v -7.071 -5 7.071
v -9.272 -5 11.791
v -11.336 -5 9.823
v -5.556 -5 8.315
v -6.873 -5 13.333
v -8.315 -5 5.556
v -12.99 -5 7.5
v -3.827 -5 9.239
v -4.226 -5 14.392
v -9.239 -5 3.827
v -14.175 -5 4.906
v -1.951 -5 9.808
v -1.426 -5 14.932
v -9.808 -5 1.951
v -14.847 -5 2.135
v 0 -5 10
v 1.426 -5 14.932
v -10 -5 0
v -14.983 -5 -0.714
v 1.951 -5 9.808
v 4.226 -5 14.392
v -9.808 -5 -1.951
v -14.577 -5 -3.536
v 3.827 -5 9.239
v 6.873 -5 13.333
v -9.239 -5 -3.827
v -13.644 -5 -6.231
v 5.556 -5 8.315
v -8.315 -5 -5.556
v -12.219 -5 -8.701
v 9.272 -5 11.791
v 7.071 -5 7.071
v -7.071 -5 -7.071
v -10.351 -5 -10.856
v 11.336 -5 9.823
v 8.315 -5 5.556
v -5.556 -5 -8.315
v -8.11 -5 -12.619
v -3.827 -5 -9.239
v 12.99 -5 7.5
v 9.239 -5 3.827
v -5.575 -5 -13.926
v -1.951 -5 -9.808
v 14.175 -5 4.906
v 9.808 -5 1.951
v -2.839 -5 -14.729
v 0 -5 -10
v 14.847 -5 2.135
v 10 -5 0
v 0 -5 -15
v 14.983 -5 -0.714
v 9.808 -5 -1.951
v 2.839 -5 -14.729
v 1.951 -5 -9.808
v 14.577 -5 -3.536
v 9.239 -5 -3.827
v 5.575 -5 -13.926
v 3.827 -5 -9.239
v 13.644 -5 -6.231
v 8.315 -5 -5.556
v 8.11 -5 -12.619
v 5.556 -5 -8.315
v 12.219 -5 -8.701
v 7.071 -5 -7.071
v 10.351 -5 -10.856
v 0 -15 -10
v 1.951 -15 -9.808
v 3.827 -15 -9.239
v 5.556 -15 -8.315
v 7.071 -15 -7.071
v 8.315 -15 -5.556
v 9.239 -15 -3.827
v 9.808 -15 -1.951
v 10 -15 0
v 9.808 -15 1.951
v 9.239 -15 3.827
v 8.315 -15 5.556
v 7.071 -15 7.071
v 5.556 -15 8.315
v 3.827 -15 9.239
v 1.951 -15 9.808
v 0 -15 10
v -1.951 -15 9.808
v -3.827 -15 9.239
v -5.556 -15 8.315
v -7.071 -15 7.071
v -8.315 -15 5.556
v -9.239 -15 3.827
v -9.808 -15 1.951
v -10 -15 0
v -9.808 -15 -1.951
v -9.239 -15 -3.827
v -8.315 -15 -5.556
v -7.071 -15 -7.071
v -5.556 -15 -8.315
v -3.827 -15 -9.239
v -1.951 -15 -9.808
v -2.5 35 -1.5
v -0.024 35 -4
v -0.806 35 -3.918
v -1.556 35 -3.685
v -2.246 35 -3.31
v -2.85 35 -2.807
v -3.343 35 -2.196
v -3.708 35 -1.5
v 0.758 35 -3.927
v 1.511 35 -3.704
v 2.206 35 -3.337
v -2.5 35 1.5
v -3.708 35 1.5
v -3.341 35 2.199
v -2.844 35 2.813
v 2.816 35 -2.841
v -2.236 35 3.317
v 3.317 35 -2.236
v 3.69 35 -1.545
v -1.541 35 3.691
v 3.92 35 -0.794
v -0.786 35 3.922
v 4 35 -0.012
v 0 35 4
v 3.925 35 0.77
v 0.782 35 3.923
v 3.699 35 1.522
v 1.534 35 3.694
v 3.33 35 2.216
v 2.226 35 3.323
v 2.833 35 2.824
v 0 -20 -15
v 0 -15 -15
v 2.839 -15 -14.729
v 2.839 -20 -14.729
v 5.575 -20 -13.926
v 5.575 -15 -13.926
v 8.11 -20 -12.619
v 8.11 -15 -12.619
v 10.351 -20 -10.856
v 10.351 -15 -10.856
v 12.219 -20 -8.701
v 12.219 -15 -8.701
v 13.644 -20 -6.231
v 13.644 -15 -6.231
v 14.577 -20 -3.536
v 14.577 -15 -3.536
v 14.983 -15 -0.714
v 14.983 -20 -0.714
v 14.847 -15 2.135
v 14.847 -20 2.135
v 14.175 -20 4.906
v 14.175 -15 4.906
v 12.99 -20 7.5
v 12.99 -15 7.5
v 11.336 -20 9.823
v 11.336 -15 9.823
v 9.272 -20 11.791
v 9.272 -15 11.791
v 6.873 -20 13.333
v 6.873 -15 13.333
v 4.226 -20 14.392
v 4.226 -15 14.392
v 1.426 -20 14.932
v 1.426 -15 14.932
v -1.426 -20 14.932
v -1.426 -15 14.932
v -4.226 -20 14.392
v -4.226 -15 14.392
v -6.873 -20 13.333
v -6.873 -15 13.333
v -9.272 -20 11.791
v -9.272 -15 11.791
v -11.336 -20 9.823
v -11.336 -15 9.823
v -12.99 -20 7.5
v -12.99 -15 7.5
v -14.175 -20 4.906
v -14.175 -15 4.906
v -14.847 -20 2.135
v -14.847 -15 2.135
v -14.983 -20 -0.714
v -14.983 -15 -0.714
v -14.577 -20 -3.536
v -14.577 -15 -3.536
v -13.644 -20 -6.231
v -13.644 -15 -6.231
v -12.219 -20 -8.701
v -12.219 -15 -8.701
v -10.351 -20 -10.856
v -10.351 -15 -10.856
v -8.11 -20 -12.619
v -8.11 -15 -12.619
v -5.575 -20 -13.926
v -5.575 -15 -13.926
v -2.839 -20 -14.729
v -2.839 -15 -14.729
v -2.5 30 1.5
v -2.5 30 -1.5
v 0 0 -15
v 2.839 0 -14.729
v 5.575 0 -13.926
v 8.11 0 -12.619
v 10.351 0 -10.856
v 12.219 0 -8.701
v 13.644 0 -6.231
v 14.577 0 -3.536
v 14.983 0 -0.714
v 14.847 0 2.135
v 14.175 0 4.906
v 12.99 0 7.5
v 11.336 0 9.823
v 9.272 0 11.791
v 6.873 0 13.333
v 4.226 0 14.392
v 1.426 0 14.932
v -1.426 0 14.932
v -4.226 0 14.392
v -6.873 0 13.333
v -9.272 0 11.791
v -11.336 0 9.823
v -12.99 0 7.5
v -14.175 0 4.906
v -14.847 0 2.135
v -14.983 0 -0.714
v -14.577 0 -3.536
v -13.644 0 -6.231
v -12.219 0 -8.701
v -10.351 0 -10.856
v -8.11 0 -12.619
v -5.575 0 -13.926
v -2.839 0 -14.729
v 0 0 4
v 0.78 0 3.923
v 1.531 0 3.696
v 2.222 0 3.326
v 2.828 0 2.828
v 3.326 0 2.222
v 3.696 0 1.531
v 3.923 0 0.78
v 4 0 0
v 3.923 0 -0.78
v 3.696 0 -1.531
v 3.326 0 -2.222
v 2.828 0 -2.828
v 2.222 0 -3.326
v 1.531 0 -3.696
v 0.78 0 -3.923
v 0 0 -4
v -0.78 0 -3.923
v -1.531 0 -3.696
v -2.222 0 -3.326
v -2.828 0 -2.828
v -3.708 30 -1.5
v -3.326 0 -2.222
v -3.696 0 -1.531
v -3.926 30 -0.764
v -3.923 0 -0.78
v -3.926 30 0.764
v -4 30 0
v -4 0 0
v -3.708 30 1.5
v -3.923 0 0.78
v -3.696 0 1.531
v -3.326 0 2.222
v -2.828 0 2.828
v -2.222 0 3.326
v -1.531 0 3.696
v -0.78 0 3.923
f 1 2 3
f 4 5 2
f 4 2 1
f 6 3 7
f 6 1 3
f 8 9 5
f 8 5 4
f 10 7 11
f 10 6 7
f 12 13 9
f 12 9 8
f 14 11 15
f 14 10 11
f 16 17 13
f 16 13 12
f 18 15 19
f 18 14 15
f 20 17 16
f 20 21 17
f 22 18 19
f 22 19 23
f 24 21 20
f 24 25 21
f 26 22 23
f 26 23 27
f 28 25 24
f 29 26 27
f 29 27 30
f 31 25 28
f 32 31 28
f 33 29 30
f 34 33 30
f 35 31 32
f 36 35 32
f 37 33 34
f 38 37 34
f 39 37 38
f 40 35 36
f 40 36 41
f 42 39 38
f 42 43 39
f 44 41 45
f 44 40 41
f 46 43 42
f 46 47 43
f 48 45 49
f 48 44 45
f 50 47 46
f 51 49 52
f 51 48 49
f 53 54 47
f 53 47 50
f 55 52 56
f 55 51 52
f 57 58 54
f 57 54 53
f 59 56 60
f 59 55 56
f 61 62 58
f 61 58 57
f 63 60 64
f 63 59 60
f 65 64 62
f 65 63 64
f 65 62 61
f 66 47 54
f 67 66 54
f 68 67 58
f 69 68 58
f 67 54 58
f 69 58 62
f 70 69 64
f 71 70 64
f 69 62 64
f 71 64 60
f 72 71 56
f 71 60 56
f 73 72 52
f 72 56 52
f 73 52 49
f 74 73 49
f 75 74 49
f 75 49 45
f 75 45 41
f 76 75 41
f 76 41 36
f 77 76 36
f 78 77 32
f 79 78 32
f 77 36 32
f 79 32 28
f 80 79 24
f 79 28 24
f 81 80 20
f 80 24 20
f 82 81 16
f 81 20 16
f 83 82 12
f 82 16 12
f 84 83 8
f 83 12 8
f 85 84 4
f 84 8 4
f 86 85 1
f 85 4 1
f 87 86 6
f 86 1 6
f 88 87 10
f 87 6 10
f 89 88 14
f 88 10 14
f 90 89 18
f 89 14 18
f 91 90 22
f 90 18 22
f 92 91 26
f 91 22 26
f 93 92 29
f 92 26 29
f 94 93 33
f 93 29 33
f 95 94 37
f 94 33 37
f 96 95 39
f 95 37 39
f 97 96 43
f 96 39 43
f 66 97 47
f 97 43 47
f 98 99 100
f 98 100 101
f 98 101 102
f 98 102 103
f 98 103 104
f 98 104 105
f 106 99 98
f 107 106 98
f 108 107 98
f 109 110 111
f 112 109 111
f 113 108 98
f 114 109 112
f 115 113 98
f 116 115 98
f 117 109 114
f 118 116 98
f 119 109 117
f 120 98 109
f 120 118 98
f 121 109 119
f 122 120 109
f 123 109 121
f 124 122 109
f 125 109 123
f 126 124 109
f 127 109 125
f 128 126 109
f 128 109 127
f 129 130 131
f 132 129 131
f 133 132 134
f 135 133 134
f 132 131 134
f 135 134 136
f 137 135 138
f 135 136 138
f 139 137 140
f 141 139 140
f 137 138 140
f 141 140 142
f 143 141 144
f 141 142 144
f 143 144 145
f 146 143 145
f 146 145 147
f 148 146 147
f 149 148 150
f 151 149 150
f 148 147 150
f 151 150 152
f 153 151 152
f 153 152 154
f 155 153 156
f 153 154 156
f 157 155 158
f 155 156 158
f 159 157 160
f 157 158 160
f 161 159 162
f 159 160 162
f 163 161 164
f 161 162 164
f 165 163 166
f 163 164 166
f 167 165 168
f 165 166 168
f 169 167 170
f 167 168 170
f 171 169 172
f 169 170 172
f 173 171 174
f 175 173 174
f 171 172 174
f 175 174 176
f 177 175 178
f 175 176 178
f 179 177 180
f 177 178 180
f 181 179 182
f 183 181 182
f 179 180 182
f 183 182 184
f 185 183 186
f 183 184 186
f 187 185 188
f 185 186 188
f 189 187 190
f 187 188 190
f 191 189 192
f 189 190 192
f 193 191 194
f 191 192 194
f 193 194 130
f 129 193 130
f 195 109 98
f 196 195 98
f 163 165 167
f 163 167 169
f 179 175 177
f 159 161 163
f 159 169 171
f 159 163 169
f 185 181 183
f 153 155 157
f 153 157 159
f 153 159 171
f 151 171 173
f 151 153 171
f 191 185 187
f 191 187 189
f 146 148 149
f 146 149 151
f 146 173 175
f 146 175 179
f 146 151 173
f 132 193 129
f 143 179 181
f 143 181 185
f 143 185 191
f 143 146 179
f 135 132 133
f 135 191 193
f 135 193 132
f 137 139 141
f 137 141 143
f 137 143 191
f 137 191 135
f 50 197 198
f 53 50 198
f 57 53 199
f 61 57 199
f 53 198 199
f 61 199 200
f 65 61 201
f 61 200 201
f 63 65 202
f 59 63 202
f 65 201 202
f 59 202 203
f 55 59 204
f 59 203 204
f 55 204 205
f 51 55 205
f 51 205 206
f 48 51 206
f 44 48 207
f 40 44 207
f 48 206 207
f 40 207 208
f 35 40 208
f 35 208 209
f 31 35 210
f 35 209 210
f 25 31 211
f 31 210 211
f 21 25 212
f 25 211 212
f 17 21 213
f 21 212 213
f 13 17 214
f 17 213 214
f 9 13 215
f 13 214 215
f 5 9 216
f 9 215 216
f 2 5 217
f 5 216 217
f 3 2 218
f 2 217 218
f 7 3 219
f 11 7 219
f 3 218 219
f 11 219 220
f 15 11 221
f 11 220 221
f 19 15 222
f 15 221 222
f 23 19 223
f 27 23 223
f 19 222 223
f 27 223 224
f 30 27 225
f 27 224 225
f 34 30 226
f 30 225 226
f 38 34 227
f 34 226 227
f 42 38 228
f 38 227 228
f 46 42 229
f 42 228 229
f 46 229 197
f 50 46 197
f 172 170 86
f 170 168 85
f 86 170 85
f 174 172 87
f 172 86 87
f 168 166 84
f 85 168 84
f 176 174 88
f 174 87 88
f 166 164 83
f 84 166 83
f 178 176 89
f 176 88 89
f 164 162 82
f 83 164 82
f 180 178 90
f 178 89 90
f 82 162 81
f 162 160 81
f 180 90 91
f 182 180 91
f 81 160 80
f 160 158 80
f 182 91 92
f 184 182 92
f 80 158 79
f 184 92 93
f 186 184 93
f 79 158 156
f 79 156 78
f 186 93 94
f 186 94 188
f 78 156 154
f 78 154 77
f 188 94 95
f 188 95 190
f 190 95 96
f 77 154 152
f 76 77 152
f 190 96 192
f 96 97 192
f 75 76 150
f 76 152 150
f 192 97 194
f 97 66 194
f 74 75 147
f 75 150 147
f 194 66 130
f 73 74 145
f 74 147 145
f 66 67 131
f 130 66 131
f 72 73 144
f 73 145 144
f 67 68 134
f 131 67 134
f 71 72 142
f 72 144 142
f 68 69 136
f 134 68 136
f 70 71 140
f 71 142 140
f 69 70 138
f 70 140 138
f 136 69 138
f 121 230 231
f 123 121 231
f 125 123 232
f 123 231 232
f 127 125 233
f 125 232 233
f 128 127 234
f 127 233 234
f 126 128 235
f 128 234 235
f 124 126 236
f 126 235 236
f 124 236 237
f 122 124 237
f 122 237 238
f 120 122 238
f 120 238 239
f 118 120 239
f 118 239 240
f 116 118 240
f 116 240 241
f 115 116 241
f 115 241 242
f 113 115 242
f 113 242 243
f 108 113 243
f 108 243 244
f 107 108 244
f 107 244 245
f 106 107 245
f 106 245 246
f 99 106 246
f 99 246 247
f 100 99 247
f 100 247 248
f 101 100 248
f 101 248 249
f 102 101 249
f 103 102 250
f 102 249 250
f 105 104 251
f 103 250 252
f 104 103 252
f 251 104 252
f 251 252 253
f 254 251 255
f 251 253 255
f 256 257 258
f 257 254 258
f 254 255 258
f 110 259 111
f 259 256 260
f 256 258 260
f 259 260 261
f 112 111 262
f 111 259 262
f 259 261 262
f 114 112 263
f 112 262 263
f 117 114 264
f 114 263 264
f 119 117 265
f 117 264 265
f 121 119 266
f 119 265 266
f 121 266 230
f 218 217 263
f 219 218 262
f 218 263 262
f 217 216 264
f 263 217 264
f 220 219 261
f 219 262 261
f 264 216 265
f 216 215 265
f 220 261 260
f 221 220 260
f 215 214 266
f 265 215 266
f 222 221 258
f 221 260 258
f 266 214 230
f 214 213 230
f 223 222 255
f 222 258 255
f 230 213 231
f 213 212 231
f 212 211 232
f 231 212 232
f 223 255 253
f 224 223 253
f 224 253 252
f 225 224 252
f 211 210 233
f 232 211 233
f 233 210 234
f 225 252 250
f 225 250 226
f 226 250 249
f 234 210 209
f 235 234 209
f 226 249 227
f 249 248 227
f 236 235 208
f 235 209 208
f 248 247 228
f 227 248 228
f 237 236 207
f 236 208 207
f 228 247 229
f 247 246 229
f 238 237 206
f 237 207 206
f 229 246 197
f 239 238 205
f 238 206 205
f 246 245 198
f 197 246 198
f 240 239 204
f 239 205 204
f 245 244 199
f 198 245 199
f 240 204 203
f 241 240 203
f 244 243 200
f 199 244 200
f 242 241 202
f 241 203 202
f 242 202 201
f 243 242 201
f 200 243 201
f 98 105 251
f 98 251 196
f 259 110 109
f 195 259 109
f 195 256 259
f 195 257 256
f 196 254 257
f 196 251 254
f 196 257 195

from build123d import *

# Parameters (mm, degrees)
SKETCH1_R           = 4
BOSS_EXTRUDE1_DEPTH = 35
SKETCH4_W           = 3
SKETCH4_H           = 3
CUT_EXTRUDE3_DEPTH  = 5
SKETCH5_R           = 15
BOSS_EXTRUDE2_DEPTH = 5
SKETCH6_R           = 10
BOSS_EXTRUDE3_DEPTH = 10
SKETCH7_R           = 15
BOSS_EXTRUDE4_DEPTH = 5


with BuildPart() as part:
    # Sketch1 → Boss-Extrude1 (new body)
    with BuildSketch(Plane(origin=(0, 0, 0), x_dir=(1, 0, 0), z_dir=(0, 1, 0))):
        with Locations(Location((0, 0, 0), (0, 0, 270))):
            Circle(SKETCH1_R)
    extrude(amount=BOSS_EXTRUDE1_DEPTH)

    # Sketch4 → Cut-Extrude3 (cut)
    with BuildSketch(Plane(origin=(0, 35, 0), x_dir=(1, 0, 0), z_dir=(0, 1, 0))):
        with Locations((-4, 0)):
            Rectangle(SKETCH4_W, SKETCH4_H)
    extrude(amount=-CUT_EXTRUDE3_DEPTH, mode=Mode.SUBTRACT)

    # Sketch5 → Boss-Extrude2 (add)
    with BuildSketch(Plane.XZ):
        with Locations(Location((0, 0, 0), (0, 0, 270))):
            Circle(SKETCH5_R)
    extrude(amount=BOSS_EXTRUDE2_DEPTH)

    # Sketch6 → Boss-Extrude3 (add)
    with BuildSketch(Plane.XZ.offset(5)):
        with Locations(Location((0, 0, 0), (0, 0, 270))):
            Circle(SKETCH6_R)
    extrude(amount=BOSS_EXTRUDE3_DEPTH)

    # Sketch7 → Boss-Extrude4 (add)
    with BuildSketch(Plane.XZ.offset(15)):
        with Locations(Location((0, 0, 0), (0, 0, 270))):
            Circle(SKETCH7_R)
    extrude(amount=BOSS_EXTRUDE4_DEPTH)


solid = part.part
